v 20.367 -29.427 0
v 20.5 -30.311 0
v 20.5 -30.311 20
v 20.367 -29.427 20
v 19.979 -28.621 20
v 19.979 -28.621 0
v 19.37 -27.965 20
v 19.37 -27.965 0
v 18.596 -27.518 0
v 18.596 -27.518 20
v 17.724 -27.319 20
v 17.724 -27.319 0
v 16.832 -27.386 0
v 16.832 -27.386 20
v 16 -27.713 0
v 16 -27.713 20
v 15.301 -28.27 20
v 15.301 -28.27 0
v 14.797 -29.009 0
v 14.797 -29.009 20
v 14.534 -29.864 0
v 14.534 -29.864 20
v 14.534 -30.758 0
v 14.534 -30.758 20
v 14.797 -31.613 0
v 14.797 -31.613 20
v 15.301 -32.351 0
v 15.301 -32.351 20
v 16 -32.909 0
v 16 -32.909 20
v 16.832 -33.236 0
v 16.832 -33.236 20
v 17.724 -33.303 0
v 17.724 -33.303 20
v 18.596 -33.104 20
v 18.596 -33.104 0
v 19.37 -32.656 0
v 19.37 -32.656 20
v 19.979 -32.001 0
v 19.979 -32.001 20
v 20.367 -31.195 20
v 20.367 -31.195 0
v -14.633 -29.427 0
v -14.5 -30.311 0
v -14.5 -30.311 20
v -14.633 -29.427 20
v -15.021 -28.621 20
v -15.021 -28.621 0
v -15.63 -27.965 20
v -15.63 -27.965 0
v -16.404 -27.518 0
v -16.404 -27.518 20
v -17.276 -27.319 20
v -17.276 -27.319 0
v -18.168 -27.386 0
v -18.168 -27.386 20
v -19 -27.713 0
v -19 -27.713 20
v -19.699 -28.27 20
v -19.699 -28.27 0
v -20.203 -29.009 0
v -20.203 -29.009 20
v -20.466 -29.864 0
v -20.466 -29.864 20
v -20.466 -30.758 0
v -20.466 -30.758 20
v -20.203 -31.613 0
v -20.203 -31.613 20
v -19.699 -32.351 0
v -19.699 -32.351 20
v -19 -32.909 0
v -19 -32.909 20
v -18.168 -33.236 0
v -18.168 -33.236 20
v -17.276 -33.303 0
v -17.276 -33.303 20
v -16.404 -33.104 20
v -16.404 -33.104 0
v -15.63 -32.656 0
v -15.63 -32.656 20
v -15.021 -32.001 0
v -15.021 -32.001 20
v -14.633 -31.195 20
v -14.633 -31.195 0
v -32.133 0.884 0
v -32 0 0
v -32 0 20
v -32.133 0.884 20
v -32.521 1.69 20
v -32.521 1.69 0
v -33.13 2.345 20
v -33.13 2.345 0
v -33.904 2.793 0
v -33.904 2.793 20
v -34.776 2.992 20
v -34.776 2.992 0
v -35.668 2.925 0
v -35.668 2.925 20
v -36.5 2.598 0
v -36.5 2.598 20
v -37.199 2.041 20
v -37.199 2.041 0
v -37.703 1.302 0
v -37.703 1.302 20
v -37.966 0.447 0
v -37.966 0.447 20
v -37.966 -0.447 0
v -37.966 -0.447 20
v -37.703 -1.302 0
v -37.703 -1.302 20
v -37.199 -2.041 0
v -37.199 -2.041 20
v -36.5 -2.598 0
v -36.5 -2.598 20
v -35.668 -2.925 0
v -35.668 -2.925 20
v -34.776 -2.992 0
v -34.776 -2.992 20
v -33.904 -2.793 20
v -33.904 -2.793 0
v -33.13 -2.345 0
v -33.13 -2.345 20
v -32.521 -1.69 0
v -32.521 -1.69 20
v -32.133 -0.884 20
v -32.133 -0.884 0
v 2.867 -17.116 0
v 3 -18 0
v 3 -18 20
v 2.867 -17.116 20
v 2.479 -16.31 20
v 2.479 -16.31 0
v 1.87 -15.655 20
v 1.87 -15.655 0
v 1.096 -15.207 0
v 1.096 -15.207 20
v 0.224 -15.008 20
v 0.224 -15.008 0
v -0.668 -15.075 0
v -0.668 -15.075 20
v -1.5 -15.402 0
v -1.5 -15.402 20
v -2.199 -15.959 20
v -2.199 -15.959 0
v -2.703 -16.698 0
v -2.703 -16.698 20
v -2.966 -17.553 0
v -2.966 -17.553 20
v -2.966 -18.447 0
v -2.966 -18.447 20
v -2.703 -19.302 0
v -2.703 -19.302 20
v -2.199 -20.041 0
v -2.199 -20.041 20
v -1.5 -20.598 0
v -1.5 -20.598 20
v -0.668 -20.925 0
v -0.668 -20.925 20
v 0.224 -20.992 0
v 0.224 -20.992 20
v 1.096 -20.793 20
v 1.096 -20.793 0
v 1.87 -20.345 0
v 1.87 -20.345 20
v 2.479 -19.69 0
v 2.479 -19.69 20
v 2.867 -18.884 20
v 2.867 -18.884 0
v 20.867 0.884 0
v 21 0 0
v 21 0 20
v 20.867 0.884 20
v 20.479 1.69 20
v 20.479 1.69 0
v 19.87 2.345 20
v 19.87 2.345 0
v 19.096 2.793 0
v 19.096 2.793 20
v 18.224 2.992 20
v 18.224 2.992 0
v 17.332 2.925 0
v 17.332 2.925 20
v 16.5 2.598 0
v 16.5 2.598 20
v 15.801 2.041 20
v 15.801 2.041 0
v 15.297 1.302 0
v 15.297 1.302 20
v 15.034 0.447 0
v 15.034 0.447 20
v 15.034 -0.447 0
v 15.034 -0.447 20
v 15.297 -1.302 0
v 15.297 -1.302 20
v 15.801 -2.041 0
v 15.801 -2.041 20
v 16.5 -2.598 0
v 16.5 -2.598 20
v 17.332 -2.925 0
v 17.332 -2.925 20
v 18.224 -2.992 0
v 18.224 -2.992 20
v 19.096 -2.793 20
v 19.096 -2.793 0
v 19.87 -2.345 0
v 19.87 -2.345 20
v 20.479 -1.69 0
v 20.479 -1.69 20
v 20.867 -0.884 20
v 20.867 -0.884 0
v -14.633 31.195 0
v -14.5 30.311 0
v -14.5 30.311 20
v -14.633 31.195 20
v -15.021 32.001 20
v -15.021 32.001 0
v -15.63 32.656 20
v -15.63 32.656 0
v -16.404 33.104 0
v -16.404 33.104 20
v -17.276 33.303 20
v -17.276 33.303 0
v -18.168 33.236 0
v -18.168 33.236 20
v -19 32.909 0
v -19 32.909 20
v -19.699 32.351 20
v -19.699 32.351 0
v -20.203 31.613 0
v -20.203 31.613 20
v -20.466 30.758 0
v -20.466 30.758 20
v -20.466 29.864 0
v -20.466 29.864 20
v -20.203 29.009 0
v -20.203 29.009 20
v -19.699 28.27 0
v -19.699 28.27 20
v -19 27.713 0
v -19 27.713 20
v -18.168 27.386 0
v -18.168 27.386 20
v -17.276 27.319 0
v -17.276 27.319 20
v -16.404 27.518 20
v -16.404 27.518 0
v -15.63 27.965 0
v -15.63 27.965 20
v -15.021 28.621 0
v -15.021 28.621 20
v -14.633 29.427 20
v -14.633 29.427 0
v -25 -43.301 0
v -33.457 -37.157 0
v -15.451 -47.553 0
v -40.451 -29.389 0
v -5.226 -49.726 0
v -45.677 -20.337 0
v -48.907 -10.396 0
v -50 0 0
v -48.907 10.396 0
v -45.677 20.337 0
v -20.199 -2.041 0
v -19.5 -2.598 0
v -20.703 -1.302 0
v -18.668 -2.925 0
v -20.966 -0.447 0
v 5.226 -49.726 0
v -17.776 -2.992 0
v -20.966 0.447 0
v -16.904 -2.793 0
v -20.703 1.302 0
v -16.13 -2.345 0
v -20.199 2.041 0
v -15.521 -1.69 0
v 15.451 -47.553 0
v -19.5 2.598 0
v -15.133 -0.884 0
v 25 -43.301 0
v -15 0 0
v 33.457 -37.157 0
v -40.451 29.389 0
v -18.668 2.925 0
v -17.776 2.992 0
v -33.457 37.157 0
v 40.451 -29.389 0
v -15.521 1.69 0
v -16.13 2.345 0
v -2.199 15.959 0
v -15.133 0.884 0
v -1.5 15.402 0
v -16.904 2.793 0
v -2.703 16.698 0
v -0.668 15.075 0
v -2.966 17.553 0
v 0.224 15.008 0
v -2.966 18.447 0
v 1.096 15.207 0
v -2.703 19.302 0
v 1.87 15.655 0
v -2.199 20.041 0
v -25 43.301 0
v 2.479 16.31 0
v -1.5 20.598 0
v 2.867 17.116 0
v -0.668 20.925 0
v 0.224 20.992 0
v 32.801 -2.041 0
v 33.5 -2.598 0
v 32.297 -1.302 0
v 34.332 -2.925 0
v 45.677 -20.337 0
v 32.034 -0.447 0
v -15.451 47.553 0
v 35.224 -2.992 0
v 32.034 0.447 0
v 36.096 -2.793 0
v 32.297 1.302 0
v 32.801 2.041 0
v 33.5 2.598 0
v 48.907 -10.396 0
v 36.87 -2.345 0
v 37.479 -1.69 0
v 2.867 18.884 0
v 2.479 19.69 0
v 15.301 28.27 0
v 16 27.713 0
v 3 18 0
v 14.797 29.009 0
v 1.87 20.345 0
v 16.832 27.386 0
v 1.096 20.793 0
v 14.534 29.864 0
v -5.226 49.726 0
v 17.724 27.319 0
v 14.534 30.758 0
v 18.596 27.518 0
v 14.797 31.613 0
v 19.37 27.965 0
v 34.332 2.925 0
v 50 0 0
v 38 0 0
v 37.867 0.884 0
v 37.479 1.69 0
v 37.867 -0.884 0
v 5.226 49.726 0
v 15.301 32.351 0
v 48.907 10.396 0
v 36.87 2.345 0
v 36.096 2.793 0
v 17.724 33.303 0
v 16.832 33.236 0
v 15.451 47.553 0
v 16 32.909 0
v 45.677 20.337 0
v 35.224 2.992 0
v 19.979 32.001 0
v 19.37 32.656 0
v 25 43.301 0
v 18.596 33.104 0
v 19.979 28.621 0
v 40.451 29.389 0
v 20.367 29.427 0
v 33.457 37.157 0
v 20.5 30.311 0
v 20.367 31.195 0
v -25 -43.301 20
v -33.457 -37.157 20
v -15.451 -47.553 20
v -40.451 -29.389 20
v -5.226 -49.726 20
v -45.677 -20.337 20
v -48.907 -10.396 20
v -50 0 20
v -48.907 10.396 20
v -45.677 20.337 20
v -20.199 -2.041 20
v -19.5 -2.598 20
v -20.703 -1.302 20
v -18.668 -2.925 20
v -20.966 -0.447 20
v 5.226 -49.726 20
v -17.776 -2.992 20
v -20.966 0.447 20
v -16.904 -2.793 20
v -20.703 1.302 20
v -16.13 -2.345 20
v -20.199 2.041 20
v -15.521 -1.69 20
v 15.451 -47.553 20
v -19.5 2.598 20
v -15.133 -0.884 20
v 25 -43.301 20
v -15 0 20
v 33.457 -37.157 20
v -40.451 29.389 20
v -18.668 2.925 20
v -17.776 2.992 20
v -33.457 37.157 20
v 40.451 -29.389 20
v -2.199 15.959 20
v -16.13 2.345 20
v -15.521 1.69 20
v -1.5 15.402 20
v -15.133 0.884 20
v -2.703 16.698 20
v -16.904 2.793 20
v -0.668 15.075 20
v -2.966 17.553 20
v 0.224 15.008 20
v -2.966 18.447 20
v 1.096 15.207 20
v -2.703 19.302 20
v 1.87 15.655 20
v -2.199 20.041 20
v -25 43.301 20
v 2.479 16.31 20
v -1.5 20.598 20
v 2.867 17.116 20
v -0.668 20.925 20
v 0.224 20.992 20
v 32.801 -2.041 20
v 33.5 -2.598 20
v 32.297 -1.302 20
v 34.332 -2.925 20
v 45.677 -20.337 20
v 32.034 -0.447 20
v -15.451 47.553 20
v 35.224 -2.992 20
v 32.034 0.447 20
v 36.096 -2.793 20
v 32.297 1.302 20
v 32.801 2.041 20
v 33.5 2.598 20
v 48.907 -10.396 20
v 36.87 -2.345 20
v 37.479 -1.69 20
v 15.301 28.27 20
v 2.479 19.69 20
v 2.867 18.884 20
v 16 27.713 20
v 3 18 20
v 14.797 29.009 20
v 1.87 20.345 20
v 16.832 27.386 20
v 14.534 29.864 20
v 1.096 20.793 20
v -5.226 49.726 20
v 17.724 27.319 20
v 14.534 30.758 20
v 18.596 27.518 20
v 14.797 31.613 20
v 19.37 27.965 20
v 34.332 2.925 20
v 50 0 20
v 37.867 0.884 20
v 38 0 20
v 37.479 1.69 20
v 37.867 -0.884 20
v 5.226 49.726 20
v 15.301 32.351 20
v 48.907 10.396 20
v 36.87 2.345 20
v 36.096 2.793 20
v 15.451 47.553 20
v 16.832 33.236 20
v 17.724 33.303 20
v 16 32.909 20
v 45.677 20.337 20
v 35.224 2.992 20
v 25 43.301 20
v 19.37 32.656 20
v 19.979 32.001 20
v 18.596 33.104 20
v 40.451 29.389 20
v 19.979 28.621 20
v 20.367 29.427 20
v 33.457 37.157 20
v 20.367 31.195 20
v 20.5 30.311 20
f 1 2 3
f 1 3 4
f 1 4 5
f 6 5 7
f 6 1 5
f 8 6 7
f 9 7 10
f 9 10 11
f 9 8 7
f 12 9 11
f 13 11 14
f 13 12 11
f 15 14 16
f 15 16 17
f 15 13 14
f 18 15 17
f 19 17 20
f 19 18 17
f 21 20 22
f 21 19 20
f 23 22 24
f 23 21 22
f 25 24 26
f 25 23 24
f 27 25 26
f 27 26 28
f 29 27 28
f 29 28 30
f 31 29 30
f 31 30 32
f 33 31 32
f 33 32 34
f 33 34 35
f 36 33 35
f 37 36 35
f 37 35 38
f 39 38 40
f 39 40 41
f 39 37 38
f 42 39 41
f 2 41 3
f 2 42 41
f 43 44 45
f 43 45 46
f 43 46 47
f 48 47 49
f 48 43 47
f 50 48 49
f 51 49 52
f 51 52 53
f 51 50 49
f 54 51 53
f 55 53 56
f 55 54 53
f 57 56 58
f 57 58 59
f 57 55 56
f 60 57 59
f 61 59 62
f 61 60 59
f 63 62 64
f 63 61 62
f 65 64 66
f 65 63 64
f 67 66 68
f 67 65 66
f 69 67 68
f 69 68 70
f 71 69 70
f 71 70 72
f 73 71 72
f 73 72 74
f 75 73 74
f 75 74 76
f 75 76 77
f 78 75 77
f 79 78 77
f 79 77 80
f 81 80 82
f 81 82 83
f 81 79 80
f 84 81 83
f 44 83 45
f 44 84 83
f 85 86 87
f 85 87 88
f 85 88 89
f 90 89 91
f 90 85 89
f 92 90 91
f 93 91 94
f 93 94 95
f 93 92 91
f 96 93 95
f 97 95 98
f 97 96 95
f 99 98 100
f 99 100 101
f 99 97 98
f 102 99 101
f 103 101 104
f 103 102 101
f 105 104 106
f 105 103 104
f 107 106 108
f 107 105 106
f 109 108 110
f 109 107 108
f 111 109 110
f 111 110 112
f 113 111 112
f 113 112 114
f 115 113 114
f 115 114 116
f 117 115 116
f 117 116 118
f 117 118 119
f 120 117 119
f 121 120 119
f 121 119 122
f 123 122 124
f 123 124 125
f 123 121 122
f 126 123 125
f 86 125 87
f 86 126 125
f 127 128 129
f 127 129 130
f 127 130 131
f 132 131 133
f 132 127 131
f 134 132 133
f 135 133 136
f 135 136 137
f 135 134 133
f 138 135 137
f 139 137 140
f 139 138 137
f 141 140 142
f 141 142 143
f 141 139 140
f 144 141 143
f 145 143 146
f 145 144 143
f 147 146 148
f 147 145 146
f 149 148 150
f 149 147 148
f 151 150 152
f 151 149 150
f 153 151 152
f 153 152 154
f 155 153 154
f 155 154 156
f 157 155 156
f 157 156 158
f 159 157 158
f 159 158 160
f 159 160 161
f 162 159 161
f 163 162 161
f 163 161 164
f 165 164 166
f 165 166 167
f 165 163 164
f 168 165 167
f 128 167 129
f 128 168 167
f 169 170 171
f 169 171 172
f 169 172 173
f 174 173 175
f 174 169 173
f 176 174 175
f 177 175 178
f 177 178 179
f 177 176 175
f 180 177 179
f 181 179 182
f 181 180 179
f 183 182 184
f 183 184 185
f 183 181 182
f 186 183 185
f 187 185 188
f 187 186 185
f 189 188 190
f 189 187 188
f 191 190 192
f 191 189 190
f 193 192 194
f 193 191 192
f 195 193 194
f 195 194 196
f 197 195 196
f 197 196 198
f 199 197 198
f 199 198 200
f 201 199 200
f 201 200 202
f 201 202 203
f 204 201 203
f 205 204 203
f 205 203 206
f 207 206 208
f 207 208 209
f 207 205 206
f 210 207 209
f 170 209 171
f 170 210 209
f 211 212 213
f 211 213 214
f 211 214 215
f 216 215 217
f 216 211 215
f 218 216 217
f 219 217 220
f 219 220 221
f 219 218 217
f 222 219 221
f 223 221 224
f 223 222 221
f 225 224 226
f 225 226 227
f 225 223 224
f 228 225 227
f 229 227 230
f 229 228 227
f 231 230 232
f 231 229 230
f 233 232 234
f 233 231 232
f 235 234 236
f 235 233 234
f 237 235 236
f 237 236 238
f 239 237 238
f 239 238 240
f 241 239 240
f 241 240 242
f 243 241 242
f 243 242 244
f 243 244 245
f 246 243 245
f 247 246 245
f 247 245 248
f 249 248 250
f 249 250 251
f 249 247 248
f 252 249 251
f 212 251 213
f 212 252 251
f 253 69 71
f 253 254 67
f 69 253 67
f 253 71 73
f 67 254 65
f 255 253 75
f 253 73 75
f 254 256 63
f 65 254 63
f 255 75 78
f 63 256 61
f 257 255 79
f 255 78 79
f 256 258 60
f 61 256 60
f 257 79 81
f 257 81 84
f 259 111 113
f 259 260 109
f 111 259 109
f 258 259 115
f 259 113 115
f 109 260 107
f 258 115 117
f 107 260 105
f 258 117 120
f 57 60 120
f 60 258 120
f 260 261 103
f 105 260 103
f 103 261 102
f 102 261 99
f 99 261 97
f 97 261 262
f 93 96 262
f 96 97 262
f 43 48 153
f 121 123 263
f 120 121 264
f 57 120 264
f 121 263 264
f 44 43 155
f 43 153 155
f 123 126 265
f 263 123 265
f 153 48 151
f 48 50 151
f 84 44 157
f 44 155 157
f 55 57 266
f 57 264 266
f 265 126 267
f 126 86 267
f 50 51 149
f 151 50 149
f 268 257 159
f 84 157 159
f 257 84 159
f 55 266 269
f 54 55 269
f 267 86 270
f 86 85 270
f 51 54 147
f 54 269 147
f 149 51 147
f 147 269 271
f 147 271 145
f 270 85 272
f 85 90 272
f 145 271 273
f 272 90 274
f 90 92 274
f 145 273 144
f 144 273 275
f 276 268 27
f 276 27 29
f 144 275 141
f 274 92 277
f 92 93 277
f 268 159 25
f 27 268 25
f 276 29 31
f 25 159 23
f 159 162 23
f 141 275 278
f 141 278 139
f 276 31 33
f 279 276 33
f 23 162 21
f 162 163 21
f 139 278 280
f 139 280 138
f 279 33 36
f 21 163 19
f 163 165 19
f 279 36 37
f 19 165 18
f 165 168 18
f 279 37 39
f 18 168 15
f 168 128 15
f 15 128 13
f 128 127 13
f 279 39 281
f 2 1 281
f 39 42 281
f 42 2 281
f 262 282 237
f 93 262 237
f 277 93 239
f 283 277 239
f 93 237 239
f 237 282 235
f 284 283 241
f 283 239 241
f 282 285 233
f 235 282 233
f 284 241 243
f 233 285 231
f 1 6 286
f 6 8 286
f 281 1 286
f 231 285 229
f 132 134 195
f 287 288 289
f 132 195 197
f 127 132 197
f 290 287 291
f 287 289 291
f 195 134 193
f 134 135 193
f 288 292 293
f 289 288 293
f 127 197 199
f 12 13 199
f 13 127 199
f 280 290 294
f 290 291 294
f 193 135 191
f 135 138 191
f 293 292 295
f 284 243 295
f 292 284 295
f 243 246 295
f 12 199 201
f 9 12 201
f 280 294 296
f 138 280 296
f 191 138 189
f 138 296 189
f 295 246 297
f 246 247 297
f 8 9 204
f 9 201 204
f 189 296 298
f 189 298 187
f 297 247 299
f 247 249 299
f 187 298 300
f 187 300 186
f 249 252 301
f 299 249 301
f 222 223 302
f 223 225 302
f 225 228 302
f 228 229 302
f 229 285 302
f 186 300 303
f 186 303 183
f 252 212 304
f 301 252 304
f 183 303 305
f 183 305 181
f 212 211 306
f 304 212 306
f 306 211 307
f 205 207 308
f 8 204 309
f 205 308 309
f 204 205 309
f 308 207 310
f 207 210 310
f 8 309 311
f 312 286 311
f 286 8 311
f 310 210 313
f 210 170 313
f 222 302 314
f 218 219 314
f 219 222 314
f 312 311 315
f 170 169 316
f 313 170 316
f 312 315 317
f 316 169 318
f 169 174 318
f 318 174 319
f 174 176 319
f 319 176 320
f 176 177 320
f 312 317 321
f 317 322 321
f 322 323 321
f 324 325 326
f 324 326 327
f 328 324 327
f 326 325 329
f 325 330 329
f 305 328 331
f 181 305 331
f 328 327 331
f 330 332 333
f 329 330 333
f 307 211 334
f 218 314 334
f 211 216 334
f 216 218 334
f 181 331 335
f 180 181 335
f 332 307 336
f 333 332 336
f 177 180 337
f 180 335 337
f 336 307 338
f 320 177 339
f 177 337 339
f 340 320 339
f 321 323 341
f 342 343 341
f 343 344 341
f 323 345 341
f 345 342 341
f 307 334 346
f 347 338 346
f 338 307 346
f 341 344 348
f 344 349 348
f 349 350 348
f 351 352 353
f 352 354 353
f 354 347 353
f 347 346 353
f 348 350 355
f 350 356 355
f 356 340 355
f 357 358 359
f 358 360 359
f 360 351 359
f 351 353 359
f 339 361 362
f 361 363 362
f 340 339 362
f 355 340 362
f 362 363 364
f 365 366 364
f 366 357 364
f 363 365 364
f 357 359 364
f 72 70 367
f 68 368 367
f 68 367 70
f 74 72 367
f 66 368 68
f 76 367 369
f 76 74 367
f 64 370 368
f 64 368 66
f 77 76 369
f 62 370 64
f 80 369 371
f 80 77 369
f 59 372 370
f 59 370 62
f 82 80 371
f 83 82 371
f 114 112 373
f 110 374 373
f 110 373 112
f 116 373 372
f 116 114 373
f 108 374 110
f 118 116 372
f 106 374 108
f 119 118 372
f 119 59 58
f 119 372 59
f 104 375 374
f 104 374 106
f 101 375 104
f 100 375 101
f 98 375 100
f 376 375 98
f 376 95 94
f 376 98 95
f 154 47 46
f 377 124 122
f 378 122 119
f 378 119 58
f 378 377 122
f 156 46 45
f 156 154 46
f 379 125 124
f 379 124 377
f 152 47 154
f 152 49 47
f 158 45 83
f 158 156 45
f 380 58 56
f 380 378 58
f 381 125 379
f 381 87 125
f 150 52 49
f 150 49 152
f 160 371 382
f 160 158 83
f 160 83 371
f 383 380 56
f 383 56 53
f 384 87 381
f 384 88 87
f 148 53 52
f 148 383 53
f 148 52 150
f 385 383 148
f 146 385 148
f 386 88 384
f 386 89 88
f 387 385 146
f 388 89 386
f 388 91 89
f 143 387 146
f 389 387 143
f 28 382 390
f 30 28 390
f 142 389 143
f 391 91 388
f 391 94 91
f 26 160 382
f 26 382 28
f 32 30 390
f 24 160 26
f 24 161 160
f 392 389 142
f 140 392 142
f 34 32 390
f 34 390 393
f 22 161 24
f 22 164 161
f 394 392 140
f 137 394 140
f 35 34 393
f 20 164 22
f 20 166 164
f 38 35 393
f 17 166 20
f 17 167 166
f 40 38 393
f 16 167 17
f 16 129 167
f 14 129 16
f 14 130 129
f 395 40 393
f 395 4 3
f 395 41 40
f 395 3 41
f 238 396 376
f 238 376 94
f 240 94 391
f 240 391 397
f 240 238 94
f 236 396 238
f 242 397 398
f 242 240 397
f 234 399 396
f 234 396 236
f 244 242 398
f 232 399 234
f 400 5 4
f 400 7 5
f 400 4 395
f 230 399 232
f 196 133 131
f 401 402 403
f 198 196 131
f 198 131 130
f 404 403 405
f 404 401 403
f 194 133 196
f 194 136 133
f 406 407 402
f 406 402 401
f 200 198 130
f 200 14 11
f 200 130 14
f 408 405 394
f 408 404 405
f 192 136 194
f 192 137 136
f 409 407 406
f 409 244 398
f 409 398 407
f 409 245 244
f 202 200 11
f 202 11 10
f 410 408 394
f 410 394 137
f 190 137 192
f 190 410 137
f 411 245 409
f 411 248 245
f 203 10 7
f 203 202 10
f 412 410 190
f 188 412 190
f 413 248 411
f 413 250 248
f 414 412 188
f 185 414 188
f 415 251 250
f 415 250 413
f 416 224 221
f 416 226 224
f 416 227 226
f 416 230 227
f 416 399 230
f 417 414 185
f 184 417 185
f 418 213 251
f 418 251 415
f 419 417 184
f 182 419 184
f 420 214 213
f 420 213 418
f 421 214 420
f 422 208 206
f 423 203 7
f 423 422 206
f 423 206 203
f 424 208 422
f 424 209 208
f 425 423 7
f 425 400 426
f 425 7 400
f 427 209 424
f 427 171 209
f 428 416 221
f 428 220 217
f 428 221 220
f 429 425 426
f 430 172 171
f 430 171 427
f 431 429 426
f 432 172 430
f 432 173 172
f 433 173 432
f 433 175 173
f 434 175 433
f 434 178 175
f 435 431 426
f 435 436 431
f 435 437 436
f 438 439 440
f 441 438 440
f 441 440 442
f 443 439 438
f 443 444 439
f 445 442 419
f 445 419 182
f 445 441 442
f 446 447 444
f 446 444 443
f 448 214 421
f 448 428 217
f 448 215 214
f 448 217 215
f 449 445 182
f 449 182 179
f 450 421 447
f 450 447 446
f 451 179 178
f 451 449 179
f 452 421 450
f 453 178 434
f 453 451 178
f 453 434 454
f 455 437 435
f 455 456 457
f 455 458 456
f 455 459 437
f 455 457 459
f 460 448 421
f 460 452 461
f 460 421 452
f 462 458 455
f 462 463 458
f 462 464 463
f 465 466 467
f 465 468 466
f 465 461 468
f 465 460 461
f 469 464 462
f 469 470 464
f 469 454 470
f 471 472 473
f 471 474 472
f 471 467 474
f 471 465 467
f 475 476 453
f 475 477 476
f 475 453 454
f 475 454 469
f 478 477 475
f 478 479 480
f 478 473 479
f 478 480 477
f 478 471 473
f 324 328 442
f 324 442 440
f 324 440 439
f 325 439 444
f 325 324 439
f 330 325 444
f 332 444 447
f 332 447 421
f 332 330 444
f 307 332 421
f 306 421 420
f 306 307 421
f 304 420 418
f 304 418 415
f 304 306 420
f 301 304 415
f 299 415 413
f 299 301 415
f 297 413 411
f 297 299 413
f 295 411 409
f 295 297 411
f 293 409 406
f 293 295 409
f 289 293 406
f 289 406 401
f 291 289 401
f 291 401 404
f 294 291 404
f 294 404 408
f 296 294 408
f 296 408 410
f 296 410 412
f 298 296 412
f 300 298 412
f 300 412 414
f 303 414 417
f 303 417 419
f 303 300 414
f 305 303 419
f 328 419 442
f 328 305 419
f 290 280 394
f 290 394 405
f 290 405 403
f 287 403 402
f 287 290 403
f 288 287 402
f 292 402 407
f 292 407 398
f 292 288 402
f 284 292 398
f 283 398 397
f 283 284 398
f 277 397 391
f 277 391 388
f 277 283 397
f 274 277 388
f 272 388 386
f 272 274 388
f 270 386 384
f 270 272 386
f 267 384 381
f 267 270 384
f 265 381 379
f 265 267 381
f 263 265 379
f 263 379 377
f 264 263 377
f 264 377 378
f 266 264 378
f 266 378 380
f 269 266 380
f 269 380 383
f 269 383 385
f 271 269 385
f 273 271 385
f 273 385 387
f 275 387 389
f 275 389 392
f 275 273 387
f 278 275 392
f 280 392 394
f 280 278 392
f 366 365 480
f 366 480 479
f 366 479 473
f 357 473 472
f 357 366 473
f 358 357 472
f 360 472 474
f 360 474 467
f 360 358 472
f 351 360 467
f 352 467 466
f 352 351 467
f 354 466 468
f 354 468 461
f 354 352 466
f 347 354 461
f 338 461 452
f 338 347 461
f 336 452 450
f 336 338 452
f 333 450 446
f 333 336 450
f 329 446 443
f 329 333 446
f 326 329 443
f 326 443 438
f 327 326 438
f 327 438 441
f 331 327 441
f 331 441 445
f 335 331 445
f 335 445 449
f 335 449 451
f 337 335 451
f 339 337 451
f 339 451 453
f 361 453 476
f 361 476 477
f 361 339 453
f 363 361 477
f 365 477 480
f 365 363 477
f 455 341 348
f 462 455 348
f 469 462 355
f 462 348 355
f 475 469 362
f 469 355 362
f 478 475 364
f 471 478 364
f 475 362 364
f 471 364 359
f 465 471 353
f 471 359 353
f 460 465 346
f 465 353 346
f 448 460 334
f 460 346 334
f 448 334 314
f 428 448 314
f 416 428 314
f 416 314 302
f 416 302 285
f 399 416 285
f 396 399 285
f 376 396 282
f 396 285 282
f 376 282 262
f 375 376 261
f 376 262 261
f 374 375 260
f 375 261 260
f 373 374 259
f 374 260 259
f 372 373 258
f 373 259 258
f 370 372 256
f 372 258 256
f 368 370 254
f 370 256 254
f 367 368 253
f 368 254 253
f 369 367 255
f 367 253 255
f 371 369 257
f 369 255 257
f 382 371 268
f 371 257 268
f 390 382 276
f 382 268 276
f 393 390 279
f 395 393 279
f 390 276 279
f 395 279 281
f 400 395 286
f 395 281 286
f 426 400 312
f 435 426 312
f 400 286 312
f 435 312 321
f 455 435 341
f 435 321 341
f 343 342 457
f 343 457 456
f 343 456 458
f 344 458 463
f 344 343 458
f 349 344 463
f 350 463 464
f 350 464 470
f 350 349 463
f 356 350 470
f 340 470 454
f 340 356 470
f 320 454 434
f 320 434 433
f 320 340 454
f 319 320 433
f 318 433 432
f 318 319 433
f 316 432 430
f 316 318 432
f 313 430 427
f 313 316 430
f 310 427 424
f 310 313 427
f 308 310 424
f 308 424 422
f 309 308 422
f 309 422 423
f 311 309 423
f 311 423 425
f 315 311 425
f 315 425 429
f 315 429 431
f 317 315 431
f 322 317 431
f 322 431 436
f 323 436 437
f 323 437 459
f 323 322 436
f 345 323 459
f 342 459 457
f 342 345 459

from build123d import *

# Parameters (mm, degrees)
SKETCH_1_R      = 50
SKETCH_1_R_2    = 3
EXTRUDE_1_DEPTH = 20


with BuildPart() as part:
    # 草图1 → 凸台-拉伸1 (new body)
    with BuildSketch(Plane.XY):
        Circle(SKETCH_1_R)
        with Locations((-18, 0)):
            Circle(SKETCH_1_R_2, mode=Mode.SUBTRACT)
        with Locations((0, 18)):
            Circle(SKETCH_1_R_2, mode=Mode.SUBTRACT)
        with Locations((18, 0)):
            Circle(SKETCH_1_R_2, mode=Mode.SUBTRACT)
        with Locations((0, -18)):
            Circle(SKETCH_1_R_2, mode=Mode.SUBTRACT)
        with Locations((-35, 0)):
            Circle(SKETCH_1_R_2, mode=Mode.SUBTRACT)
        with Locations((-17.5, 30.310889132)):
            Circle(SKETCH_1_R_2, mode=Mode.SUBTRACT)
        with Locations((17.5, 30.310889132)):
            Circle(SKETCH_1_R_2, mode=Mode.SUBTRACT)
        with Locations((35, 0)):
            Circle(SKETCH_1_R_2, mode=Mode.SUBTRACT)
        with Locations((17.5, -30.310889132)):
            Circle(SKETCH_1_R_2, mode=Mode.SUBTRACT)
        with Locations((-17.5, -30.310889132)):
            Circle(SKETCH_1_R_2, mode=Mode.SUBTRACT)
    extrude(amount=EXTRUDE_1_DEPTH)


solid = part.part
